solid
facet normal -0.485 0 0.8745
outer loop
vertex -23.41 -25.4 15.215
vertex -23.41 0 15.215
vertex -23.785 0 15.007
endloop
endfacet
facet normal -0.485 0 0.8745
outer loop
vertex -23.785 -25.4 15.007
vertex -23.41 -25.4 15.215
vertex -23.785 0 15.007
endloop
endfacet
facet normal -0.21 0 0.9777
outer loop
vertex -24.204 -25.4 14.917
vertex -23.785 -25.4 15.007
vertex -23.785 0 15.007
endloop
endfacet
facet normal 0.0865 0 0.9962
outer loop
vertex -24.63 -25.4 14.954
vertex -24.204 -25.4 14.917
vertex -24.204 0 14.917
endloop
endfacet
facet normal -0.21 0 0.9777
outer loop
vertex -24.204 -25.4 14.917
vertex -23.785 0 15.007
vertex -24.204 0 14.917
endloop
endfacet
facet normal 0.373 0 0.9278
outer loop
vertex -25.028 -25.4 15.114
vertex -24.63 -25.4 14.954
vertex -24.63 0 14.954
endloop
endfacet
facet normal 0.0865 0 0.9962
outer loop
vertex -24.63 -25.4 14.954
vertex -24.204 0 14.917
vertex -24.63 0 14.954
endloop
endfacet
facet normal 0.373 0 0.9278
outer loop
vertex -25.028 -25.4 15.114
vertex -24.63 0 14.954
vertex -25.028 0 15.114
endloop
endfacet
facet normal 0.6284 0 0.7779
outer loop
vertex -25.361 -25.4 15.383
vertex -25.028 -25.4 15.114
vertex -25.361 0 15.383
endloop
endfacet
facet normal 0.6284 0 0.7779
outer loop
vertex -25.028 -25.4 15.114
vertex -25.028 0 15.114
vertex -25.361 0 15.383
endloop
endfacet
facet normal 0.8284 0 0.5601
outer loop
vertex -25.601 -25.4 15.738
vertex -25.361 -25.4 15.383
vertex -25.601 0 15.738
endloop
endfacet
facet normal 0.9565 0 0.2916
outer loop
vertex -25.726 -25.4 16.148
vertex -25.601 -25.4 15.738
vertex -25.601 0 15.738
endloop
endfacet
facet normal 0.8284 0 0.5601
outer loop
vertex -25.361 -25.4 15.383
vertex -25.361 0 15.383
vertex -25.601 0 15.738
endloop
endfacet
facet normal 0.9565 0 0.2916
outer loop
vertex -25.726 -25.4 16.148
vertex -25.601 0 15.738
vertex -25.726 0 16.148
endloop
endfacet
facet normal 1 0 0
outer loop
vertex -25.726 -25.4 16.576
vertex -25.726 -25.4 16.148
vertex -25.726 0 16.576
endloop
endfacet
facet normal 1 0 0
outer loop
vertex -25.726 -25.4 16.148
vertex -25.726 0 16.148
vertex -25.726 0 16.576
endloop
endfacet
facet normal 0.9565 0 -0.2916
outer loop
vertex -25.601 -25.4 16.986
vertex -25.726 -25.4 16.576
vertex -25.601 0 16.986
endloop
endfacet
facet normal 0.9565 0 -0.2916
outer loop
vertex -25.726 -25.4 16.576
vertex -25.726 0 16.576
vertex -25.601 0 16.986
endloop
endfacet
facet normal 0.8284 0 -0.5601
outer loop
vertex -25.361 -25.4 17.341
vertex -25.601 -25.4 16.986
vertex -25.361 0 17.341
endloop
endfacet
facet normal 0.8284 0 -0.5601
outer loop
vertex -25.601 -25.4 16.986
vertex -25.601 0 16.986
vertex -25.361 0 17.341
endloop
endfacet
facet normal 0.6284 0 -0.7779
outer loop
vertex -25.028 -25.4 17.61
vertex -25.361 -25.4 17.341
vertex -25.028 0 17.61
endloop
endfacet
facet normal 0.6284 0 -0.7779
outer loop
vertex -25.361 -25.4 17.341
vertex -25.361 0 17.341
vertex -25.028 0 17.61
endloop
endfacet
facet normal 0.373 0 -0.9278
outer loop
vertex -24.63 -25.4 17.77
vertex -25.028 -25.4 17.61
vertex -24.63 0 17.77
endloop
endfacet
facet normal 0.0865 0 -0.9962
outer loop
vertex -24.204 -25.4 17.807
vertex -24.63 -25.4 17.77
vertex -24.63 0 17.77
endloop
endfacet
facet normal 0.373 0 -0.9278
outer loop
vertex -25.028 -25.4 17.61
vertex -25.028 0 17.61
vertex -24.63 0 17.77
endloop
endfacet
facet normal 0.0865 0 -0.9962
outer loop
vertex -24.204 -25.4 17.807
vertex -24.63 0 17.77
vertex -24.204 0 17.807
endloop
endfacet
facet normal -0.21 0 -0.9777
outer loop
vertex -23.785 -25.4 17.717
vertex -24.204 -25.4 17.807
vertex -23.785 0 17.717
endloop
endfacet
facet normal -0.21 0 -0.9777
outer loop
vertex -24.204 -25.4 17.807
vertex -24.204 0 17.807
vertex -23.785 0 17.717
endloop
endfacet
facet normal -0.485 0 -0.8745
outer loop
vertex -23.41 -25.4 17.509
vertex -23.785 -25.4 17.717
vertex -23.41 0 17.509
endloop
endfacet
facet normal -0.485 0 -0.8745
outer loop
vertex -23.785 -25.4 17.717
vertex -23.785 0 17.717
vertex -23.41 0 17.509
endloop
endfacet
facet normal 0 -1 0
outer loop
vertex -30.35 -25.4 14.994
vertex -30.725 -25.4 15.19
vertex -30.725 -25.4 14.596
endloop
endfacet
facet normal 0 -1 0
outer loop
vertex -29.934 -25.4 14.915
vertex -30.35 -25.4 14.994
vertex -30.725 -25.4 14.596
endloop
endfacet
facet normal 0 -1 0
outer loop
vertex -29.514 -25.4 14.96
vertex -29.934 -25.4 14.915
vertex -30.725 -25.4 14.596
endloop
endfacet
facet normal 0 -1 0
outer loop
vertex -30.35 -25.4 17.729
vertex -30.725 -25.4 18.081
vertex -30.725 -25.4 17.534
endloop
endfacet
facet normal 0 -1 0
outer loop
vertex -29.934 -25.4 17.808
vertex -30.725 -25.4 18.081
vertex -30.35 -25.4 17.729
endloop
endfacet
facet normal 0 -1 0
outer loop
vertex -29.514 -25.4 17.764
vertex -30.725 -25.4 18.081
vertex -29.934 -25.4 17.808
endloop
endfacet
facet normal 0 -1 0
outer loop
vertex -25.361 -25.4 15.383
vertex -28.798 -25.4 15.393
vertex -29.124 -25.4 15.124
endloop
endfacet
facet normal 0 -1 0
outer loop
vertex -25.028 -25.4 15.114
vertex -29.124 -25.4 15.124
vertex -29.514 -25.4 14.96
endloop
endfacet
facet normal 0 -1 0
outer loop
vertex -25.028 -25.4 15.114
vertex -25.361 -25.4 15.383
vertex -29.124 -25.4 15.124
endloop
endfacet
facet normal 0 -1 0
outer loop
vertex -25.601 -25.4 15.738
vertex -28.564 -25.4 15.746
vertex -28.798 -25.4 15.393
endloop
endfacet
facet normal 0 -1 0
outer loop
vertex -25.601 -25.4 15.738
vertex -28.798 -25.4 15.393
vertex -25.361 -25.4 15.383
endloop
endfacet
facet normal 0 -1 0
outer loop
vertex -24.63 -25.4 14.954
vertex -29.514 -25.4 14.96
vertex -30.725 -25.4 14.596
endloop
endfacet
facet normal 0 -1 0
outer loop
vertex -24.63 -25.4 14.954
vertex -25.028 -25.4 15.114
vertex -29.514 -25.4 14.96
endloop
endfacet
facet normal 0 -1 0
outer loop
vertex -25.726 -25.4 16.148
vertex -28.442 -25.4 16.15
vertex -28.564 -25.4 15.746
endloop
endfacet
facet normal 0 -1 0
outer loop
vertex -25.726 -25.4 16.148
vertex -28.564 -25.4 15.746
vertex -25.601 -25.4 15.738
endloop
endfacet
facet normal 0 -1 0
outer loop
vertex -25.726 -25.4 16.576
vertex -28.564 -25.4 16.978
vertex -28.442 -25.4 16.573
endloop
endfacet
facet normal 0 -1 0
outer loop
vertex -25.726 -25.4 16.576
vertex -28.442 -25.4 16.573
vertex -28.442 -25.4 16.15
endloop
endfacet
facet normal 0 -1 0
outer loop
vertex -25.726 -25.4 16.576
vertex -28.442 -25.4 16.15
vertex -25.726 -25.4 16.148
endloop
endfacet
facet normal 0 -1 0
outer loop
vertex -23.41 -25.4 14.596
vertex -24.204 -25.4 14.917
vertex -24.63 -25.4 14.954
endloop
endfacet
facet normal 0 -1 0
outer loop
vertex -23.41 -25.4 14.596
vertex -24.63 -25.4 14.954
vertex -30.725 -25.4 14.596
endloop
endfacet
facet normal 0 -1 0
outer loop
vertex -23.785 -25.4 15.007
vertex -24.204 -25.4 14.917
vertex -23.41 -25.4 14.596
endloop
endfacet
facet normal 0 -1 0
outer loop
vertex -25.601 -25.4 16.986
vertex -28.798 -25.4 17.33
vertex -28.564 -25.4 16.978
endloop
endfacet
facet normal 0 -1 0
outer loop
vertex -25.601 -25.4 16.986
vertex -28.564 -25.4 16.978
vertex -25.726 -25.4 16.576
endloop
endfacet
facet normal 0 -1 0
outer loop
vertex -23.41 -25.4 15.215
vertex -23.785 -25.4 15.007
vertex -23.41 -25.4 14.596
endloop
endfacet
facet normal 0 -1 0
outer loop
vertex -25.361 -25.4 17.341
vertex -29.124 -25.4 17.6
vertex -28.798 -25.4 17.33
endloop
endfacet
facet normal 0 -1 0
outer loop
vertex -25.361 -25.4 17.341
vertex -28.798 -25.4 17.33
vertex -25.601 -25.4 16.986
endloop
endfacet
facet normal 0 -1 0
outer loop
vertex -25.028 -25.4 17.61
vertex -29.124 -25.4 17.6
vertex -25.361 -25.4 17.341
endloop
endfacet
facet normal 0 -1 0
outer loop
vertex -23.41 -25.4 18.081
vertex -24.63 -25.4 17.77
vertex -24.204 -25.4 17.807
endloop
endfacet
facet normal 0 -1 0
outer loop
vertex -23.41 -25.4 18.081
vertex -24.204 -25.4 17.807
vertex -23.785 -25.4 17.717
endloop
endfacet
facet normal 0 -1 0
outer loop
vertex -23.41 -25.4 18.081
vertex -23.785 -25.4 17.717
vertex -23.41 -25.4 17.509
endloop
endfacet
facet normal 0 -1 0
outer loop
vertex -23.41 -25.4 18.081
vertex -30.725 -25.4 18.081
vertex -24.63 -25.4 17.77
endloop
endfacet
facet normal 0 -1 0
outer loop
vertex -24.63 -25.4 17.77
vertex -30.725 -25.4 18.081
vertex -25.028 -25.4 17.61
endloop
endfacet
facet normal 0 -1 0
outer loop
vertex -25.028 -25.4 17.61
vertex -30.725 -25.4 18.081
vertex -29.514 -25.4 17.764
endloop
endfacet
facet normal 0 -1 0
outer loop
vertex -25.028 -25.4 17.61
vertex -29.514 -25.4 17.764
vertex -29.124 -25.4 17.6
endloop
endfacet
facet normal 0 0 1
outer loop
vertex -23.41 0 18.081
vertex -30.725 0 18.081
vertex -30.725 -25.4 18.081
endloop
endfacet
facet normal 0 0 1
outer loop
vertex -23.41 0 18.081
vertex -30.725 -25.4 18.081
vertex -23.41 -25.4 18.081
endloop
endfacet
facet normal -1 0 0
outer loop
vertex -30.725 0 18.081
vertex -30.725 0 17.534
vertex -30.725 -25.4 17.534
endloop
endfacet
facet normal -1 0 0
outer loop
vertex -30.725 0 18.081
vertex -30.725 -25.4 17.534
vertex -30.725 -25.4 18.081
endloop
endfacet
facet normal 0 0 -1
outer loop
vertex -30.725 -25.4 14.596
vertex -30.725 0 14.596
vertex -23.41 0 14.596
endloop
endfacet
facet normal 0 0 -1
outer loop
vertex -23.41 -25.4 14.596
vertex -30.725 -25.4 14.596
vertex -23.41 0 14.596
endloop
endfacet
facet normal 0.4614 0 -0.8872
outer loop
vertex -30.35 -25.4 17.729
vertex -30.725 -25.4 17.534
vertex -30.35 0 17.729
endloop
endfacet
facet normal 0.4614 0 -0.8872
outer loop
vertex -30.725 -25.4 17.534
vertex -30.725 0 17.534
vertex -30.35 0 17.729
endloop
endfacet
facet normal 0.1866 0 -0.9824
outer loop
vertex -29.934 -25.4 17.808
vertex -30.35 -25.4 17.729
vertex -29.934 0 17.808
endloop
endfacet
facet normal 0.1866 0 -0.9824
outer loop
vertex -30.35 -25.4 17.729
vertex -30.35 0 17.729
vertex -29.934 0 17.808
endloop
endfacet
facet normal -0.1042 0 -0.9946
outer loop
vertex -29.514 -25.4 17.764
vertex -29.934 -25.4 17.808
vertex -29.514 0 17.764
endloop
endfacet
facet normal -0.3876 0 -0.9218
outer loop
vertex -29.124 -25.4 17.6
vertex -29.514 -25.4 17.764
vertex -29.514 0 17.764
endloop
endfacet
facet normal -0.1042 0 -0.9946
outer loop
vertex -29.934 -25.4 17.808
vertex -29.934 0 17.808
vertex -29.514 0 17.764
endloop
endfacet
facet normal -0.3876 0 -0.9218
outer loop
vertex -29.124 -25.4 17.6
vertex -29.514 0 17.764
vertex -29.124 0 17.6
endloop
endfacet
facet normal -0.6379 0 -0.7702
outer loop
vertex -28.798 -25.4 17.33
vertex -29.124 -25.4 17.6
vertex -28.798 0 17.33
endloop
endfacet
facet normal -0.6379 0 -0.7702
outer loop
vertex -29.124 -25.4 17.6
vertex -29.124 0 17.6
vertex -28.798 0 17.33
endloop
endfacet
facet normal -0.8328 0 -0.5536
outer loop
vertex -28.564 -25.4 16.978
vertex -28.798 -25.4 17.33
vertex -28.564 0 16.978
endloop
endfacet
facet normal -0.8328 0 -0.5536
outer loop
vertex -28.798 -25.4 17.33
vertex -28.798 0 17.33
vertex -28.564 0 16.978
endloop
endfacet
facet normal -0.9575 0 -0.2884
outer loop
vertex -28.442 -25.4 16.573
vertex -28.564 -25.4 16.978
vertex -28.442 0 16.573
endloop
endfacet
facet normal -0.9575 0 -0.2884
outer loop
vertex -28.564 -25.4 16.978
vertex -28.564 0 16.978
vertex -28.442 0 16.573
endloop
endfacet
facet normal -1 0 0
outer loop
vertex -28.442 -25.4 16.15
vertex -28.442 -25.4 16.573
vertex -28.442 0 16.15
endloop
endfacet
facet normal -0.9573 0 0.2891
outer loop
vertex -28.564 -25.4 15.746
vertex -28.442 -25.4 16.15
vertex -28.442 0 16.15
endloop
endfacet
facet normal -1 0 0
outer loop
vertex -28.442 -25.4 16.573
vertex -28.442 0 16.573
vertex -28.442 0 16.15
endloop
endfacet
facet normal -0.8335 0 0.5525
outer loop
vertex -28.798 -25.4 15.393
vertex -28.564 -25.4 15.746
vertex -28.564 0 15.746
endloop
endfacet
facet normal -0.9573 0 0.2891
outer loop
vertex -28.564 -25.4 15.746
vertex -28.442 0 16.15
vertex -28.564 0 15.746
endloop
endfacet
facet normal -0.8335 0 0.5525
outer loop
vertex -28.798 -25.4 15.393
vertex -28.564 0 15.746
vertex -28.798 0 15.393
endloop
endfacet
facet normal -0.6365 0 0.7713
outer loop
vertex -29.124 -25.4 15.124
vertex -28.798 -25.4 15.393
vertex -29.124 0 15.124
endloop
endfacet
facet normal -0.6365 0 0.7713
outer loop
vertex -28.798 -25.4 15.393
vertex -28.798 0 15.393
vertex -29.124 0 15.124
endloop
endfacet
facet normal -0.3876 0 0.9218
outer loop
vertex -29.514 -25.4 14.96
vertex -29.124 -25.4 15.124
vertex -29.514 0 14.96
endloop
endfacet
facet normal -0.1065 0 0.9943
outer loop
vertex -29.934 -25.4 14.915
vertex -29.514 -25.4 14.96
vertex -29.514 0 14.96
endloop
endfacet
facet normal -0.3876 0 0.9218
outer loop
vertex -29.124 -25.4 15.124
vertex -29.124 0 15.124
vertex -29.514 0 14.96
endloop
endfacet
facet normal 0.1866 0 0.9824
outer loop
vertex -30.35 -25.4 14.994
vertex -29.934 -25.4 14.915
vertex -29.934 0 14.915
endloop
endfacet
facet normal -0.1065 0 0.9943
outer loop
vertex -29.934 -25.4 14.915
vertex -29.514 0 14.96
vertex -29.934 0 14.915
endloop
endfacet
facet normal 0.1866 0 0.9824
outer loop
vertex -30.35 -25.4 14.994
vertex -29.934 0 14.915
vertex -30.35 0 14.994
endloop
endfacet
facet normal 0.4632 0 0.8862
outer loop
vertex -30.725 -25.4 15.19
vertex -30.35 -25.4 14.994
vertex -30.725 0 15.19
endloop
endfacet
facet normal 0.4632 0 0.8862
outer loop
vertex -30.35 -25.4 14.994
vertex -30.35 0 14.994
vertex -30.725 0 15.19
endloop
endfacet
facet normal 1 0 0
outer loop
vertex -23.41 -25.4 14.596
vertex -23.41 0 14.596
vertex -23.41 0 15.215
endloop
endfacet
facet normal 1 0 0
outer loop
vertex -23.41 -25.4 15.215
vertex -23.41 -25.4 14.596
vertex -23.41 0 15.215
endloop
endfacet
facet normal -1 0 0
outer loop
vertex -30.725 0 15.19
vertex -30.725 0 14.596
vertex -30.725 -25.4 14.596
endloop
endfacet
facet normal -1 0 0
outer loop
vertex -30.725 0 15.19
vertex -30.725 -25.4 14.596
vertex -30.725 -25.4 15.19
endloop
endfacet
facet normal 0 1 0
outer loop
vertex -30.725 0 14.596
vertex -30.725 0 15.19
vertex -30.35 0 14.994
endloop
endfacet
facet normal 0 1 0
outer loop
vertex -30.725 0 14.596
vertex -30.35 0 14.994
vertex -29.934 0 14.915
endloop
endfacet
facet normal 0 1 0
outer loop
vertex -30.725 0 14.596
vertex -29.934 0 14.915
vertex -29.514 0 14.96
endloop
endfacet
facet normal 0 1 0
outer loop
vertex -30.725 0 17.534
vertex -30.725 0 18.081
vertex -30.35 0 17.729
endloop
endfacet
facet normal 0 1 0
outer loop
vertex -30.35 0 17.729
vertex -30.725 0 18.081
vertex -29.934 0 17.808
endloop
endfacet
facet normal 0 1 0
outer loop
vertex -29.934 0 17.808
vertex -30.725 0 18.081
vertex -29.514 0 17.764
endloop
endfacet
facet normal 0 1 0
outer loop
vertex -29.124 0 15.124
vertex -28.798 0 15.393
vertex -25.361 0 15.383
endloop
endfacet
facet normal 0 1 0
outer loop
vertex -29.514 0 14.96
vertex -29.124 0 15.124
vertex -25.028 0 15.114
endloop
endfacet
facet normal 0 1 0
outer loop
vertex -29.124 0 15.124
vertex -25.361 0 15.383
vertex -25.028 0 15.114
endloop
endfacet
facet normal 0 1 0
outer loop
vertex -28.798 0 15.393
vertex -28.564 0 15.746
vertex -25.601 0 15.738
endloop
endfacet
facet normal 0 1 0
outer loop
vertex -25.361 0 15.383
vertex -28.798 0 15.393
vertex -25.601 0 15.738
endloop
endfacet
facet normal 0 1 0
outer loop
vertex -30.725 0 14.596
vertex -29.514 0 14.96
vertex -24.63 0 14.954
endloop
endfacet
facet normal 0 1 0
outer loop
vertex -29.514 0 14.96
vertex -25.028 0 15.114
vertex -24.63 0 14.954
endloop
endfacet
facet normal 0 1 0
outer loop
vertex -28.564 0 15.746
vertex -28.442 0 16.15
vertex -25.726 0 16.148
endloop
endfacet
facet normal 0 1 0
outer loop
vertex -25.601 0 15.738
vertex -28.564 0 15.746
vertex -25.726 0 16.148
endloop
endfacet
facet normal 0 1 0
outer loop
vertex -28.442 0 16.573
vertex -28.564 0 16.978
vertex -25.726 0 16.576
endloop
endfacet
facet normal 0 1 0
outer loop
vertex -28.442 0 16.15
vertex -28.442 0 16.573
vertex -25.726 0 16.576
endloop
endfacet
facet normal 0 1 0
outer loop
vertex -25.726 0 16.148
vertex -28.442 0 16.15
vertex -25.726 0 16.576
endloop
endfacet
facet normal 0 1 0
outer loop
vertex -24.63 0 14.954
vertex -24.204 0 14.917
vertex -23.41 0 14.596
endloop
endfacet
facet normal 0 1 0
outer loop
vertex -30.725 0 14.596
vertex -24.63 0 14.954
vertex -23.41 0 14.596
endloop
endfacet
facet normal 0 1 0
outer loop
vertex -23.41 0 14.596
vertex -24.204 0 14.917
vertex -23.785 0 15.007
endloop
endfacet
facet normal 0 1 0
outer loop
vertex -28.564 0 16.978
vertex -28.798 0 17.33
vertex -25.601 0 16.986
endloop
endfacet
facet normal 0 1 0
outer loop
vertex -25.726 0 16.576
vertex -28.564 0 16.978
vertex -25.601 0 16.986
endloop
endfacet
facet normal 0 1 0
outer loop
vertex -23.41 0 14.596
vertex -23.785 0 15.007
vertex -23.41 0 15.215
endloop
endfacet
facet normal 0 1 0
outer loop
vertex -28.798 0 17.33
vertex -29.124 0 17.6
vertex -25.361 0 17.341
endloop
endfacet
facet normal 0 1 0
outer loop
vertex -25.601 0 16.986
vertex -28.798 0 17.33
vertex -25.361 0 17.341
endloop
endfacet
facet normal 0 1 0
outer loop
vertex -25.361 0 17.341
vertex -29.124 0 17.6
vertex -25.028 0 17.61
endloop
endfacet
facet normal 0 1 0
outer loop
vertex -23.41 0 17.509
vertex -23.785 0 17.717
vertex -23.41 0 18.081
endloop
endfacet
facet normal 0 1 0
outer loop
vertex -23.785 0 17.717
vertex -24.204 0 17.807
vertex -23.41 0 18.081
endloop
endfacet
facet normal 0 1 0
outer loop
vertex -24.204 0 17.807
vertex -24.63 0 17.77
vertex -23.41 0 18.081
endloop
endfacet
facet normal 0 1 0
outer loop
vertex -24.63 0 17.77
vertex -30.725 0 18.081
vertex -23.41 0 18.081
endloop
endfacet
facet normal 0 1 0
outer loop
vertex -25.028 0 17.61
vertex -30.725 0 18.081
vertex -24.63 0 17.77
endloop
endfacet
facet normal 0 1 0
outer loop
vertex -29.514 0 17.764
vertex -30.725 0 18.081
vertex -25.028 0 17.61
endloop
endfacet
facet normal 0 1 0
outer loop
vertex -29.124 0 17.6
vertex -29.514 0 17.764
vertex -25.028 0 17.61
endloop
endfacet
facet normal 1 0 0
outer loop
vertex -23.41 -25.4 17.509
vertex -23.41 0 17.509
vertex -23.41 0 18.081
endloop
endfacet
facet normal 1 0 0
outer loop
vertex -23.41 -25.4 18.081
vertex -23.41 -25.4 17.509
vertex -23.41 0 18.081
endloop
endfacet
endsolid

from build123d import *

# Parameters (mm, degrees)
F0_W     = 7.31414
F0_H     = 3.485261
F1_DEPTH = 25.4
F3_D     = 2.8956
F5_D     = 2.8956


with BuildPart() as f1:
    # F0 (on Front) → F1 (new body)
    with BuildSketch(Plane.XZ):
        with Locations((-27.067565, 16.338196)):
            Rectangle(F0_W, F0_H)
    extrude(amount=F1_DEPTH)

    # F3 (through all)
    with Locations(Plane.XZ.offset(25.4)):
        with Locations((-29.874383, 16.361794)):
            Hole(F3_D / 2)

    # F5 (through all)
    with Locations(Plane.XZ.offset(25.4)):
        with Locations((-24.294116, 16.361794)):
            Hole(F5_D / 2)


solid = f1.part
